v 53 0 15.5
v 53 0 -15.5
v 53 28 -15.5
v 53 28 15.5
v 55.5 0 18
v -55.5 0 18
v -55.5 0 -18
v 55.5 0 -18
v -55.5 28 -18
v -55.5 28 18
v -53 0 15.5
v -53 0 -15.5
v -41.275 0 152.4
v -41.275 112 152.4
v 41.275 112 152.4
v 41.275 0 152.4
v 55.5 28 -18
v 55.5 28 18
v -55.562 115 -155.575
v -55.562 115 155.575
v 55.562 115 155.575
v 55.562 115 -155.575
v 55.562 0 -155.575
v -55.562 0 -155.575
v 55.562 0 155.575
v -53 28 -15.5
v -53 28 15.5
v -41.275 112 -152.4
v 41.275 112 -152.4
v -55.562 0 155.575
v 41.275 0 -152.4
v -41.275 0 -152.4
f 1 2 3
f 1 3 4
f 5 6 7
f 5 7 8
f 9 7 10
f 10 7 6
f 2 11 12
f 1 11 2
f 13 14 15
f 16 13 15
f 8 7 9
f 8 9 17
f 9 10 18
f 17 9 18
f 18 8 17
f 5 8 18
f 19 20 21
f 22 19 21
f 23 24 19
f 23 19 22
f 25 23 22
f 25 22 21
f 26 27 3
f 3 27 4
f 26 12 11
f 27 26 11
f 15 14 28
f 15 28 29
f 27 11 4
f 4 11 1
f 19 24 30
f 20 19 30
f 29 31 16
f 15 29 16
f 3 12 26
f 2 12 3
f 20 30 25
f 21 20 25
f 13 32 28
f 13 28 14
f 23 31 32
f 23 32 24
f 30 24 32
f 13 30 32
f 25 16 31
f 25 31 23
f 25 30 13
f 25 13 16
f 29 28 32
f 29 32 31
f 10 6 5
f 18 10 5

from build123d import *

# Parameters (mm, degrees)
F0_W     = 111.125
F0_H     = 311.15
F2_DEPTH = 115
F1_W     = 82.55
F1_H     = 304.8
F3_DEPTH = 112
F4_W     = 111
F4_H     = 36
F5_DEPTH = 28
F6_W     = 106
F6_H     = 31
F7_DEPTH = 28


with BuildPart() as f2:
    # F0 (on Front) → F2 (new body)
    with BuildSketch(Plane.XZ):
        Rectangle(F0_W, F0_H)
    extrude(amount=-F2_DEPTH)


with BuildPart() as f2b:
    # F1 (on Front) → F2, piece 2 (new body)
    with BuildSketch(Plane.XZ):
        Rectangle(F1_W, F1_H)
    extrude(amount=-F2_DEPTH)


with BuildPart() as f3_tool:
    # F1 (on Front) → F3 (new body)
    with BuildSketch(Plane.XZ):
        Rectangle(F1_W, F1_H)
    extrude(amount=-F3_DEPTH)


with BuildPart() as f2_1:
    add(f2.part)

    # F3: cut by f3_tool
    add(f3_tool.part, mode=Mode.SUBTRACT)


with BuildPart() as f2b_1:
    add(f2b.part)

    # F3: cut by f3_tool
    add(f3_tool.part, mode=Mode.SUBTRACT)


with BuildPart() as f5:
    # F4 (on Front) → F5 (new body)
    with BuildSketch(Plane.XZ):
        Rectangle(F4_W, F4_H)
    extrude(amount=-F5_DEPTH)


with BuildPart() as f7:
    # F6 (on Front) → F7 (new body)
    with BuildSketch(Plane.XZ):
        Rectangle(F6_W, F6_H)
    extrude(amount=-F7_DEPTH)


solid = Compound([f2_1.part, f5.part, f7.part])
